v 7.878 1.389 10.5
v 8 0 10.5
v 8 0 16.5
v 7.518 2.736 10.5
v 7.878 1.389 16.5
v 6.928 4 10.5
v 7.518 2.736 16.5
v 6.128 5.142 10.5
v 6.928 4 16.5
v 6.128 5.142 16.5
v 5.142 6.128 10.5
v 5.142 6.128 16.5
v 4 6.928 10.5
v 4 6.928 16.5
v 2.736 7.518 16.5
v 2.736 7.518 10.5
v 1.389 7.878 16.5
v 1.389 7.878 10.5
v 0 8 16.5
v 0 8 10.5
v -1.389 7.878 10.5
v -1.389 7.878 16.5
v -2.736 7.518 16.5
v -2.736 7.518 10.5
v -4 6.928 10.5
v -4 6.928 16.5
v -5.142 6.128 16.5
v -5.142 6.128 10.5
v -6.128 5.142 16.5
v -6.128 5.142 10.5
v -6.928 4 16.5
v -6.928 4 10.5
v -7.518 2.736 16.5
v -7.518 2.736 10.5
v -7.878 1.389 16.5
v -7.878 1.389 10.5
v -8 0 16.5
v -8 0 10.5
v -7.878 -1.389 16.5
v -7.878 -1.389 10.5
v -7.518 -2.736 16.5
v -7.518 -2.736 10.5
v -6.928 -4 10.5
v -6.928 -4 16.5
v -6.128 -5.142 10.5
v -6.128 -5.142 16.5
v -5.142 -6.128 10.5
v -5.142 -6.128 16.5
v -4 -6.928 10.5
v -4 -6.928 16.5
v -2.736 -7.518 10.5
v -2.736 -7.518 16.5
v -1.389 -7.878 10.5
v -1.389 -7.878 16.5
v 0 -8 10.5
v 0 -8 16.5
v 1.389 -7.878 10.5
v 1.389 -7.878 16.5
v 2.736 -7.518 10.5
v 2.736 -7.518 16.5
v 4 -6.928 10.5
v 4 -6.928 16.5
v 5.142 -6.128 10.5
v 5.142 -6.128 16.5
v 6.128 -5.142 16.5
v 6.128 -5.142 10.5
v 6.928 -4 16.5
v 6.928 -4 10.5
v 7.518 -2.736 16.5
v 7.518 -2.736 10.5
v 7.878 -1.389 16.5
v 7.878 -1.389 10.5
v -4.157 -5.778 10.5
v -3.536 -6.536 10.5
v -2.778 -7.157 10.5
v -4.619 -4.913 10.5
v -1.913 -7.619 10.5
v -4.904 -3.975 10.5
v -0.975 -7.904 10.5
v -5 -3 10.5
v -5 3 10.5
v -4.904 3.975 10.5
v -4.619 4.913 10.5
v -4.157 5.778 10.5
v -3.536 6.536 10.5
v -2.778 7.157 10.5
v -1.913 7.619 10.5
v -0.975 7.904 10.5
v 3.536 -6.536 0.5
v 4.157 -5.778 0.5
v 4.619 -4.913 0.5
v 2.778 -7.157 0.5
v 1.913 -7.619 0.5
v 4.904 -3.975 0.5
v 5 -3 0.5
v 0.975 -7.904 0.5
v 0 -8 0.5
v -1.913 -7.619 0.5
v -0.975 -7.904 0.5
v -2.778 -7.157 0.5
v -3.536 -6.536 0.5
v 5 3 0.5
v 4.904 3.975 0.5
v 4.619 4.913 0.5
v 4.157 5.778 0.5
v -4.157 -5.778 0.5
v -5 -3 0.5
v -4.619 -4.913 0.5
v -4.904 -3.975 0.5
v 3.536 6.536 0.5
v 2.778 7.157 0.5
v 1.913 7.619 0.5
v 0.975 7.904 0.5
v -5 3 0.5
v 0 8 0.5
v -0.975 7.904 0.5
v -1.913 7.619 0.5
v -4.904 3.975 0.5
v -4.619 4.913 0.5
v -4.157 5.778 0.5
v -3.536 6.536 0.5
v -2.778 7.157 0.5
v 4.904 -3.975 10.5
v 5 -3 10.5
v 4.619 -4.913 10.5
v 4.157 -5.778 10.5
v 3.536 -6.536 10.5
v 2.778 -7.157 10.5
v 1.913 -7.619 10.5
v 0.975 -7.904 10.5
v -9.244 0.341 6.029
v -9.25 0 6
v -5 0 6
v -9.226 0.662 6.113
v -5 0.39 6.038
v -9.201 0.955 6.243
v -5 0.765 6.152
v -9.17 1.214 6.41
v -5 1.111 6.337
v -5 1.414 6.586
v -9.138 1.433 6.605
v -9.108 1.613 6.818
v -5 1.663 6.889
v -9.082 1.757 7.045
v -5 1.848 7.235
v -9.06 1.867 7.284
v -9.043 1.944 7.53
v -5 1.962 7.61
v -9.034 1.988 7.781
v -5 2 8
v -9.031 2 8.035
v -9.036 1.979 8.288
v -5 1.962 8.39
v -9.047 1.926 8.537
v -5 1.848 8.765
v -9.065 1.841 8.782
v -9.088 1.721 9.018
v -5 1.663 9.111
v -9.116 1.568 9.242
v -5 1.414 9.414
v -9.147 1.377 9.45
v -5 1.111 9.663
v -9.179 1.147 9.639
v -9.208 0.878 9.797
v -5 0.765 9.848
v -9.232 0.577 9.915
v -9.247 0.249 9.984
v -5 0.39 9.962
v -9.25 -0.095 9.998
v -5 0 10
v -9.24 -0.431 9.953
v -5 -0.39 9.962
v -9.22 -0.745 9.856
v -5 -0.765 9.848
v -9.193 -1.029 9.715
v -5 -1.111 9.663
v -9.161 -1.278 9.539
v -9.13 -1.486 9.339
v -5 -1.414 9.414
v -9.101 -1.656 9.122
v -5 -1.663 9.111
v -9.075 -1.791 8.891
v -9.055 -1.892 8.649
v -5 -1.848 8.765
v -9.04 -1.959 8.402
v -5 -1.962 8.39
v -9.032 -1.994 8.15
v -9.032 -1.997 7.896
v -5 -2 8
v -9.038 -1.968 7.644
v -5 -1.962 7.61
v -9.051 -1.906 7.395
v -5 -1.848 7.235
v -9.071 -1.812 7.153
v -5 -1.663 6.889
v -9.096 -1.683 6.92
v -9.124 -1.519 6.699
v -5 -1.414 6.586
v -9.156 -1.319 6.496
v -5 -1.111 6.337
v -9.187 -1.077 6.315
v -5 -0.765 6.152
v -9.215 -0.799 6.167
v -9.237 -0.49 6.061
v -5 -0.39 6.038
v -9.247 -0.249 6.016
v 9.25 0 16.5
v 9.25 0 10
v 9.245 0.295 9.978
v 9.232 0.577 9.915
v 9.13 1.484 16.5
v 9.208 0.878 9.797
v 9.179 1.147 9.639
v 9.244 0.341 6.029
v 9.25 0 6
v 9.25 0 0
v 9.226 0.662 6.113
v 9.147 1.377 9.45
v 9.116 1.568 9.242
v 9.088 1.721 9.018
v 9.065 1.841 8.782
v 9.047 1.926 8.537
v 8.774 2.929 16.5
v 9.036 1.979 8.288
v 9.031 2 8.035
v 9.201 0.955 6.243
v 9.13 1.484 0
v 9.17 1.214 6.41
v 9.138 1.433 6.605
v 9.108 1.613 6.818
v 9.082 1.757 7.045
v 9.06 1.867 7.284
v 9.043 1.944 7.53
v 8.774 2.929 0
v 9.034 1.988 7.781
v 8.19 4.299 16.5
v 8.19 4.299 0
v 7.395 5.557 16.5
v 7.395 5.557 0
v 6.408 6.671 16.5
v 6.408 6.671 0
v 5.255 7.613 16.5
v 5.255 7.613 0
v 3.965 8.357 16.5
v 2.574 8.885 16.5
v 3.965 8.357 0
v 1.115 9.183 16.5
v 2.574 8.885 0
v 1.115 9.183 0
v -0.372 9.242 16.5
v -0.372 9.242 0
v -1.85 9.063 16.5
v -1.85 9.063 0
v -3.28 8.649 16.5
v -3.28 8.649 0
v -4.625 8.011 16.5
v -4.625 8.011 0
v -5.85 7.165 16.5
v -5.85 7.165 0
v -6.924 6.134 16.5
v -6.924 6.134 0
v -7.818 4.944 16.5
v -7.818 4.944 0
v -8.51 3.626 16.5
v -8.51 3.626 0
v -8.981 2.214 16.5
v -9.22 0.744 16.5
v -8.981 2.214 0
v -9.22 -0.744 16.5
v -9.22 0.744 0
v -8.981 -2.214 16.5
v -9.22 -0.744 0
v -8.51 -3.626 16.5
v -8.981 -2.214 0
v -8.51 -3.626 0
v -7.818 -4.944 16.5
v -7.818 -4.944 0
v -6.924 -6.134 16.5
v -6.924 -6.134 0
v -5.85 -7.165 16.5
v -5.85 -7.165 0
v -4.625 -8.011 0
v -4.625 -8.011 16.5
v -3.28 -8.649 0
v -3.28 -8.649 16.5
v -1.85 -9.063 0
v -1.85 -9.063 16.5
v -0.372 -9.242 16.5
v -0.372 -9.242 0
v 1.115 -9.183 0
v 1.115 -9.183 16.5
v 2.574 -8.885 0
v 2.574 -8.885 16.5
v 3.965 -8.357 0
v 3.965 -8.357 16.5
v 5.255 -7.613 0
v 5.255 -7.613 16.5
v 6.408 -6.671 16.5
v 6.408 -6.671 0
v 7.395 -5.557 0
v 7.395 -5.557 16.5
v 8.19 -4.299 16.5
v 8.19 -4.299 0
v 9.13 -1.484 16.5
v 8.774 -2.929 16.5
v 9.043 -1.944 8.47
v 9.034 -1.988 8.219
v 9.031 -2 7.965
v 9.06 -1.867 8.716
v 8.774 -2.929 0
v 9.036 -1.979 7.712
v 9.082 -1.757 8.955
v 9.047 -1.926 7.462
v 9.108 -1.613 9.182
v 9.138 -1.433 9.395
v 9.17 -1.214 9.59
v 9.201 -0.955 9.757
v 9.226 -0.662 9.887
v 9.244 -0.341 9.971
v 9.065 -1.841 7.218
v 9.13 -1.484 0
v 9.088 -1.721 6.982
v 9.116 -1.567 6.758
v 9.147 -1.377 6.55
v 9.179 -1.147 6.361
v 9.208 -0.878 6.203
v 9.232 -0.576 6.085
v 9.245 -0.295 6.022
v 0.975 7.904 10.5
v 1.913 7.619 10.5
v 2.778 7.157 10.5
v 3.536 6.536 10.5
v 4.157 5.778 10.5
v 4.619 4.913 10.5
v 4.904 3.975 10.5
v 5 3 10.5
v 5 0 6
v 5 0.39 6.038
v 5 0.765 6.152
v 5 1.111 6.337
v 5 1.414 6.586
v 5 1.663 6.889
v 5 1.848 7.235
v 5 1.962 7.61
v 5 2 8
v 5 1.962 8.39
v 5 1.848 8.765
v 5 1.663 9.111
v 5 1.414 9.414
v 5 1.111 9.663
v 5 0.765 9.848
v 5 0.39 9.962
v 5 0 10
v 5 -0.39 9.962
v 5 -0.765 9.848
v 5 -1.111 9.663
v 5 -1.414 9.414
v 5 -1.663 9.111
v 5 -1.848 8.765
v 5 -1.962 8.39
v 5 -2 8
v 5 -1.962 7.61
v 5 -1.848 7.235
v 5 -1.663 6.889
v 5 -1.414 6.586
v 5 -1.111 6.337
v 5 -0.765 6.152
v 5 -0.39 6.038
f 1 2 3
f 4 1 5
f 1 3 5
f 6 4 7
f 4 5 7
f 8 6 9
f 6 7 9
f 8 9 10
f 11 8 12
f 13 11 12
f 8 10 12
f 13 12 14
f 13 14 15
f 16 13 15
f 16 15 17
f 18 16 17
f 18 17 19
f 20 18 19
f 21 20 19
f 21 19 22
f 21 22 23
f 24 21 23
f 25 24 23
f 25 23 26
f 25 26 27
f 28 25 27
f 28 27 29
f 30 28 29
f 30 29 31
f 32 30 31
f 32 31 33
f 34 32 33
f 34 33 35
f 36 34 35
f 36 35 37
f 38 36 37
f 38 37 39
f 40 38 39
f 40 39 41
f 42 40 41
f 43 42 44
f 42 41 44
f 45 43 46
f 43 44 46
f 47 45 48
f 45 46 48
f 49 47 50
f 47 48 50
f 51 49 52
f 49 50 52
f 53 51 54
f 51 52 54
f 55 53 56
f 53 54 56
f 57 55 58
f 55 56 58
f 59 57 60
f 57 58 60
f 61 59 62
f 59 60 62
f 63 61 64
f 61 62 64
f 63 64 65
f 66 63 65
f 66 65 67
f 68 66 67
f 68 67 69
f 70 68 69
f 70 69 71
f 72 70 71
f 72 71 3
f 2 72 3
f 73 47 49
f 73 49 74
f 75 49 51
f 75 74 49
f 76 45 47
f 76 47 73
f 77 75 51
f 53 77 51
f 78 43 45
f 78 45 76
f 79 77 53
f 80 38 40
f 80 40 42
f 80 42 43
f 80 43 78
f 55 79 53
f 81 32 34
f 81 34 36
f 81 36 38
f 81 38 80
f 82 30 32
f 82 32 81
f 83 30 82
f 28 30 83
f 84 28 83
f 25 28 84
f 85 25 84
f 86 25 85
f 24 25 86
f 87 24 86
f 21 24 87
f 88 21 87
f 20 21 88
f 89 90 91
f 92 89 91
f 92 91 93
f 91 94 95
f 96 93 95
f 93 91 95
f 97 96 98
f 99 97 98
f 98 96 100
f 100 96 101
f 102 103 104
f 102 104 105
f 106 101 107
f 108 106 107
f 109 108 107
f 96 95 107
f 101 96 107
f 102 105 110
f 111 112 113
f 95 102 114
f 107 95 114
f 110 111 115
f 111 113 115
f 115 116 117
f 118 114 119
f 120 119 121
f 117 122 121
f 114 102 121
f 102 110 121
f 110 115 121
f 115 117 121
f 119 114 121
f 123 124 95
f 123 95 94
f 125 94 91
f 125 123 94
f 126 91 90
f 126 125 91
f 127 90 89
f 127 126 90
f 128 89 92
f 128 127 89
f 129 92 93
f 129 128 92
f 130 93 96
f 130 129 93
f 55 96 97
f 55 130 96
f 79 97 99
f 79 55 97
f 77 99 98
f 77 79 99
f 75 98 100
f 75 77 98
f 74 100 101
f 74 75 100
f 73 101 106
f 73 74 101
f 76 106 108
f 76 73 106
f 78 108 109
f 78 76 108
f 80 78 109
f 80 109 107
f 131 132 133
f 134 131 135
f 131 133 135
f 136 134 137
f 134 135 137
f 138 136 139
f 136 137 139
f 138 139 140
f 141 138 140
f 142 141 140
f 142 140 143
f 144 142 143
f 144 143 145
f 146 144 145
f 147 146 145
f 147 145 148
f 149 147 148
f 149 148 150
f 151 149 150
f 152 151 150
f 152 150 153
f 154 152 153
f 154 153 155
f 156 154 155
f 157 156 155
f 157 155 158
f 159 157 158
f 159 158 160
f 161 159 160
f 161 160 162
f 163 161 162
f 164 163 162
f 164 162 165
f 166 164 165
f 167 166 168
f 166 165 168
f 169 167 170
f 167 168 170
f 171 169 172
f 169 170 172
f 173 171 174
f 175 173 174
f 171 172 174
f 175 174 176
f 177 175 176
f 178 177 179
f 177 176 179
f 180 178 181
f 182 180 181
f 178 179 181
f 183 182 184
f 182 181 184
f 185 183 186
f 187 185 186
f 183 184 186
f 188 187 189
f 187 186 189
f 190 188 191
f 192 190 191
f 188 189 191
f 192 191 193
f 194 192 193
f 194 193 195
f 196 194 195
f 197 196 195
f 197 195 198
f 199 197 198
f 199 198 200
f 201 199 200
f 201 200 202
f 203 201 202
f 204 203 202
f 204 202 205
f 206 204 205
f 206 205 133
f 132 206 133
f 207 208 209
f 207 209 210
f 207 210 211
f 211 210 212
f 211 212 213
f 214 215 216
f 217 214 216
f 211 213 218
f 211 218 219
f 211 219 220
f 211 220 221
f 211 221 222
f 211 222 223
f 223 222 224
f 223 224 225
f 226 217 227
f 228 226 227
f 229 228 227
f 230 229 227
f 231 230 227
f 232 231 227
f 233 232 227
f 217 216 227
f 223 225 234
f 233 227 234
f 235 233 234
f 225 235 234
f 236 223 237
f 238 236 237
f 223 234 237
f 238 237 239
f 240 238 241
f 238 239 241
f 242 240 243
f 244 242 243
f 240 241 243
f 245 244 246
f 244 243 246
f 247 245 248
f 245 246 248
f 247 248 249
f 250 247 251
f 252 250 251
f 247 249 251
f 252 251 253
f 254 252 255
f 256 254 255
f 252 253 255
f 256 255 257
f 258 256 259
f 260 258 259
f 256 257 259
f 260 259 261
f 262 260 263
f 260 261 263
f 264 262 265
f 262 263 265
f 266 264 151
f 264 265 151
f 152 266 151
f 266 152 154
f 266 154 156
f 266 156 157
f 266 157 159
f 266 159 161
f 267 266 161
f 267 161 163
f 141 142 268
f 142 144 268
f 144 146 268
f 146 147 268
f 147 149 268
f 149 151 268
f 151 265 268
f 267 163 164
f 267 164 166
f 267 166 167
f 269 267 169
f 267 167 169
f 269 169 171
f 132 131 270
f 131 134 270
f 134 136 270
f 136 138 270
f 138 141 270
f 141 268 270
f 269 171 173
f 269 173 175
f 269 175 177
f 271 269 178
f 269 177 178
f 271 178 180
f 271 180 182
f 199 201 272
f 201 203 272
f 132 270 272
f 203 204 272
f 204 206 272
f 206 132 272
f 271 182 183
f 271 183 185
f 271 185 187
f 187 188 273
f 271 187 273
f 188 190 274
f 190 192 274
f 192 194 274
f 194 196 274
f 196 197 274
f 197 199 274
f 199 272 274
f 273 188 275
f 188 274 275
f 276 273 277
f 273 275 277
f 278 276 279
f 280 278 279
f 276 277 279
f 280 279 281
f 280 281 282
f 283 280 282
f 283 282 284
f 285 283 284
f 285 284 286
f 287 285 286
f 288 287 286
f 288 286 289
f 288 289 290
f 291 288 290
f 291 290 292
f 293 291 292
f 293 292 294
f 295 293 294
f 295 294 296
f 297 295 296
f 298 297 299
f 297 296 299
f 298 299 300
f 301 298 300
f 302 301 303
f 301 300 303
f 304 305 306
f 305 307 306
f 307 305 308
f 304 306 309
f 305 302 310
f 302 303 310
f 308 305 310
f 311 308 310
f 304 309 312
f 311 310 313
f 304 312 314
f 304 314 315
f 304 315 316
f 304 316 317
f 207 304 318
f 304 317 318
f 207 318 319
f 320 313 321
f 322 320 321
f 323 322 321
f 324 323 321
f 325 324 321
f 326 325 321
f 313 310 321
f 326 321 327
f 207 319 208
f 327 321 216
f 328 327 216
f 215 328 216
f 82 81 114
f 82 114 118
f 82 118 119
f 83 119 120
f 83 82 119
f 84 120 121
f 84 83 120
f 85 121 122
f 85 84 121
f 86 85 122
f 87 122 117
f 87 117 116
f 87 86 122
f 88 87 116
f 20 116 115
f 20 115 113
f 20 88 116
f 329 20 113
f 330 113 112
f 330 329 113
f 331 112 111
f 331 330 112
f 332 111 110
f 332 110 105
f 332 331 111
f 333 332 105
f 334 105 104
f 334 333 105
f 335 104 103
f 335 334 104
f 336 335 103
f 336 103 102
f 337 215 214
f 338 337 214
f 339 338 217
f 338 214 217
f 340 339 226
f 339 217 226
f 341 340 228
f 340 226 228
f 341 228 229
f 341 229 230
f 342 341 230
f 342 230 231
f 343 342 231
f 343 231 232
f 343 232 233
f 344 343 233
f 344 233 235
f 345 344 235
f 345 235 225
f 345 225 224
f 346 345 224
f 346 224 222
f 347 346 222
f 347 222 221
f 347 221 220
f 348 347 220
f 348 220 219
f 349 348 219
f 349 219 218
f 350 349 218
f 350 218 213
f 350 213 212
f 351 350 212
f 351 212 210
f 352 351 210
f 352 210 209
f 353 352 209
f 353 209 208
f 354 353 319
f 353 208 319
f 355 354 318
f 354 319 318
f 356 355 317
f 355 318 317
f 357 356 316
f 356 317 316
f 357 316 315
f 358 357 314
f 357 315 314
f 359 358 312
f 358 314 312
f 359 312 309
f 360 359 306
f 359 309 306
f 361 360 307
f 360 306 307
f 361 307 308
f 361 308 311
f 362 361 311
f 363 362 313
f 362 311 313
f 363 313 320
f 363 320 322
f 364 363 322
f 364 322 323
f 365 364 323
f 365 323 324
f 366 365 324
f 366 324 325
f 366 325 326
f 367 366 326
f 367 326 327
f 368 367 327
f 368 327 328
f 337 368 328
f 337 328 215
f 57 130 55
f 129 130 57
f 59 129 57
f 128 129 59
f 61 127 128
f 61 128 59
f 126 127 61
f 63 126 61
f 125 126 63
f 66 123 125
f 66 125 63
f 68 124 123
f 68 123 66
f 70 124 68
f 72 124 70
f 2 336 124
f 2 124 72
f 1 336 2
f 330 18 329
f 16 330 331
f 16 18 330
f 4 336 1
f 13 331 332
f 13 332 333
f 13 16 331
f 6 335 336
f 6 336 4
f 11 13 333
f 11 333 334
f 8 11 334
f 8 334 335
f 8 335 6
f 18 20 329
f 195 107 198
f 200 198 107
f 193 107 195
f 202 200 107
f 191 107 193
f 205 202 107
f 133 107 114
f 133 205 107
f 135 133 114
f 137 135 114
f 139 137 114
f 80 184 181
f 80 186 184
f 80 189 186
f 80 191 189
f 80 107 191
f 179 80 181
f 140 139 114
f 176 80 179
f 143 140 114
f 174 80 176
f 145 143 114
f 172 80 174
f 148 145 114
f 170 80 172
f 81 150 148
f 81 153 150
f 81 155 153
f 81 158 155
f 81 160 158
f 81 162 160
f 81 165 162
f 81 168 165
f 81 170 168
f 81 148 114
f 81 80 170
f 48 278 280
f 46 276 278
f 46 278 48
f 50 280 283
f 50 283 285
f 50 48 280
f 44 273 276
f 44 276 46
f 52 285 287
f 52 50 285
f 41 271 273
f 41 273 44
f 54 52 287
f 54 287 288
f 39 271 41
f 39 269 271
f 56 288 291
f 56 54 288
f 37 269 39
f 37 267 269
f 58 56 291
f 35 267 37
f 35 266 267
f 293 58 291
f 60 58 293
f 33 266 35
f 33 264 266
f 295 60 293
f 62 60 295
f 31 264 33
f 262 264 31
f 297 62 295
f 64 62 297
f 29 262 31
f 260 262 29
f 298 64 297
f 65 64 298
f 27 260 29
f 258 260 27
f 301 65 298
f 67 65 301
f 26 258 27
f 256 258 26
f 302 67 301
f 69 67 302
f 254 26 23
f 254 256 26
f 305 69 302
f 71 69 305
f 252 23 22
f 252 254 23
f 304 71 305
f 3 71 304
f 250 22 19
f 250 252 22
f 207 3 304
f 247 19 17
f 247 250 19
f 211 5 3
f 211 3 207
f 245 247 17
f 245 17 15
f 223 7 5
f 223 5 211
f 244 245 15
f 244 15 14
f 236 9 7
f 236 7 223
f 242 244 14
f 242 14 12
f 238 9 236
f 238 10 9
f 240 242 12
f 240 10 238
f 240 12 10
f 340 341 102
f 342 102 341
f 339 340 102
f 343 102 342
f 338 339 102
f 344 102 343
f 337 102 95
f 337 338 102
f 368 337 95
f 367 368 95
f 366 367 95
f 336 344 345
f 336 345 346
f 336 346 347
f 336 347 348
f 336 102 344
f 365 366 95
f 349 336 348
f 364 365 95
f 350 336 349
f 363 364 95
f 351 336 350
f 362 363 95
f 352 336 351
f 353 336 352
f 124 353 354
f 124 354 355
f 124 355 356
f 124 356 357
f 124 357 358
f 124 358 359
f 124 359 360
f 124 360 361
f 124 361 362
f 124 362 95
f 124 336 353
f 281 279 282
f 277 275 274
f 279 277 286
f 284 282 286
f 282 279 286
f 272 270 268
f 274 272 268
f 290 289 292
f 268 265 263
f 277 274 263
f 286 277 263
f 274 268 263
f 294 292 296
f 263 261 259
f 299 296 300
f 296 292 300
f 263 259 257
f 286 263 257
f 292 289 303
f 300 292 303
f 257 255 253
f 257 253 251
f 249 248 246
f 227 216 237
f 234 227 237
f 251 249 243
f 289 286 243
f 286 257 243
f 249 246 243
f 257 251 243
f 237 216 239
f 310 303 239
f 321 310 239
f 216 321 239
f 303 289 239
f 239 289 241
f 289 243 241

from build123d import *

# Parameters (mm, degrees)
ESQUISSE1_R             = 9.25
BASE_EXTRUSION_DEPTH    = 16.5
ESQUISSE2_R             = 2
ENL_V_MAT_EXTRU_1_DEPTH = 27.458694223
ESQUISSE3_R             = 8
ENL_V_MAT_EXTRU_2_DEPTH = 6
ENL_V_MAT_EXTRU_3_DEPTH = 10


with BuildPart() as part:
    # Esquisse1 → Base-Extrusion (new body)
    with BuildSketch(Plane.XY):
        Circle(ESQUISSE1_R)
    extrude(amount=BASE_EXTRUSION_DEPTH)

    # Esquisse2 → Enlèv. mat.-Extru.1 (cut, through all)
    with BuildSketch(Plane(origin=(9.25, 0, 0), x_dir=(0, 0, -1), z_dir=(1, 0, 0))):
        with Locations((-8, 0)):
            Circle(ESQUISSE2_R)
    extrude(amount=-ENL_V_MAT_EXTRU_1_DEPTH, mode=Mode.SUBTRACT)

    # Esquisse3 → Enlèv. mat.-Extru.2 (cut)
    with BuildSketch(Plane.XY.offset(16.5)):
        Circle(ESQUISSE3_R)
    extrude(amount=-ENL_V_MAT_EXTRU_2_DEPTH, mode=Mode.SUBTRACT)

    # Esquisse4 → Enlèv. mat.-Extru.3 (cut)
    with BuildSketch(Plane.XY.offset(10.5)):
        with BuildLine():
            Line((5, 3), (5, -3))
            ThreePointArc((5, -3), (0, -8), (-5, -3))
            Line((-5, -3), (-5, 3))
            ThreePointArc((-5, 3), (0, 8), (5, 3))
        make_face()
    extrude(amount=-ENL_V_MAT_EXTRU_3_DEPTH, mode=Mode.SUBTRACT)


solid = part.part
